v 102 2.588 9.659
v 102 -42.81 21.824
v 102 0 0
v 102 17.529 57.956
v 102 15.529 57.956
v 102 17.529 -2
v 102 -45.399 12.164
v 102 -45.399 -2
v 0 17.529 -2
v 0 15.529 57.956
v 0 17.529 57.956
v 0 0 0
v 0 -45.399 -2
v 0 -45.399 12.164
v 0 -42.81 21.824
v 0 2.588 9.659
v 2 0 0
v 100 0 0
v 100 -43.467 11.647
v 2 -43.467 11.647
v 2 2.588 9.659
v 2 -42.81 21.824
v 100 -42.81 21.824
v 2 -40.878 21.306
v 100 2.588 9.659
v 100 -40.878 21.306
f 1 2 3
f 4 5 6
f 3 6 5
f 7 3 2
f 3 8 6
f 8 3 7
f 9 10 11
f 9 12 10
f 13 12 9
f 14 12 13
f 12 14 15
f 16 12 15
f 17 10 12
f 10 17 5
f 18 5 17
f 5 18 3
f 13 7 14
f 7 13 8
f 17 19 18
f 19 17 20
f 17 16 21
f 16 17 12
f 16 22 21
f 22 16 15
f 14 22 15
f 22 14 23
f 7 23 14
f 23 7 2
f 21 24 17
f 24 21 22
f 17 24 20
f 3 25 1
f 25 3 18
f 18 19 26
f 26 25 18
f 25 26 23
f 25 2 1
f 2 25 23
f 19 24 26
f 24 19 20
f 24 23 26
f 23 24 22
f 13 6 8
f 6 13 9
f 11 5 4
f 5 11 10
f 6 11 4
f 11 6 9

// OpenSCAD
/* vim: set ai et ts=4 sw=4: */
// http://www.openscad.org/cheatsheet/

width = 98; // multimeter width
depth = 47; // multimeter depth (thickness)
height = 60; // multimeter height - only part in the stand
wall_height = 10; // height of the "walls"
thickness = 2;
angle = 75;
render_walls = true; // for debugging

stand_width = width + 2*thickness;
stand_depth = height / sqrt(2);
stand_height =(height + depth + thickness) / sqrt(2);

module triangle(w, d, h) {
    delta = 2; // small value for better rendering
    difference() {
        cube([w, d, h]);

        translate([-delta, 0, 0])
            rotate([asin(h / sqrt(h*h + d*d)), 0, 0])
                cube([w+2*delta, 100*d, sqrt(h*h + d*d)]);
    }
}

union() {

// back "triangle"
triangle(width+2*thickness, height*sin(90-angle), height*sin(angle));

// front/bottom "triangle"
translate([width+2*thickness,0,0])
    rotate([0,0,180])
        triangle(width+2*thickness, depth*sin(angle), depth*sin(90-angle));

// horisontal "base"
translate([0,-depth*sin(angle),-thickness])
    cube([width+2*thickness,
          depth*sin(angle)+height*sin(90-angle),
          thickness]);

// vertical "base"
translate([0,height*sin(90-angle),-thickness])
    cube([width+2*thickness,thickness,height*sin(angle)+thickness]);

if(render_walls) {
    // left "wall"
    rotate([angle,0,0])
        cube([thickness,wall_height,depth]);

    // right "wall"
    translate([width+thickness,0,0])
        rotate([angle,0,0])
            cube([thickness,wall_height,depth]);

    // front "wall"
    translate([thickness,-depth*sin(angle),depth*sin(90-angle)])
        rotate([angle-90,0,0])
            cube([width,thickness,wall_height]);
} // if

} // union
